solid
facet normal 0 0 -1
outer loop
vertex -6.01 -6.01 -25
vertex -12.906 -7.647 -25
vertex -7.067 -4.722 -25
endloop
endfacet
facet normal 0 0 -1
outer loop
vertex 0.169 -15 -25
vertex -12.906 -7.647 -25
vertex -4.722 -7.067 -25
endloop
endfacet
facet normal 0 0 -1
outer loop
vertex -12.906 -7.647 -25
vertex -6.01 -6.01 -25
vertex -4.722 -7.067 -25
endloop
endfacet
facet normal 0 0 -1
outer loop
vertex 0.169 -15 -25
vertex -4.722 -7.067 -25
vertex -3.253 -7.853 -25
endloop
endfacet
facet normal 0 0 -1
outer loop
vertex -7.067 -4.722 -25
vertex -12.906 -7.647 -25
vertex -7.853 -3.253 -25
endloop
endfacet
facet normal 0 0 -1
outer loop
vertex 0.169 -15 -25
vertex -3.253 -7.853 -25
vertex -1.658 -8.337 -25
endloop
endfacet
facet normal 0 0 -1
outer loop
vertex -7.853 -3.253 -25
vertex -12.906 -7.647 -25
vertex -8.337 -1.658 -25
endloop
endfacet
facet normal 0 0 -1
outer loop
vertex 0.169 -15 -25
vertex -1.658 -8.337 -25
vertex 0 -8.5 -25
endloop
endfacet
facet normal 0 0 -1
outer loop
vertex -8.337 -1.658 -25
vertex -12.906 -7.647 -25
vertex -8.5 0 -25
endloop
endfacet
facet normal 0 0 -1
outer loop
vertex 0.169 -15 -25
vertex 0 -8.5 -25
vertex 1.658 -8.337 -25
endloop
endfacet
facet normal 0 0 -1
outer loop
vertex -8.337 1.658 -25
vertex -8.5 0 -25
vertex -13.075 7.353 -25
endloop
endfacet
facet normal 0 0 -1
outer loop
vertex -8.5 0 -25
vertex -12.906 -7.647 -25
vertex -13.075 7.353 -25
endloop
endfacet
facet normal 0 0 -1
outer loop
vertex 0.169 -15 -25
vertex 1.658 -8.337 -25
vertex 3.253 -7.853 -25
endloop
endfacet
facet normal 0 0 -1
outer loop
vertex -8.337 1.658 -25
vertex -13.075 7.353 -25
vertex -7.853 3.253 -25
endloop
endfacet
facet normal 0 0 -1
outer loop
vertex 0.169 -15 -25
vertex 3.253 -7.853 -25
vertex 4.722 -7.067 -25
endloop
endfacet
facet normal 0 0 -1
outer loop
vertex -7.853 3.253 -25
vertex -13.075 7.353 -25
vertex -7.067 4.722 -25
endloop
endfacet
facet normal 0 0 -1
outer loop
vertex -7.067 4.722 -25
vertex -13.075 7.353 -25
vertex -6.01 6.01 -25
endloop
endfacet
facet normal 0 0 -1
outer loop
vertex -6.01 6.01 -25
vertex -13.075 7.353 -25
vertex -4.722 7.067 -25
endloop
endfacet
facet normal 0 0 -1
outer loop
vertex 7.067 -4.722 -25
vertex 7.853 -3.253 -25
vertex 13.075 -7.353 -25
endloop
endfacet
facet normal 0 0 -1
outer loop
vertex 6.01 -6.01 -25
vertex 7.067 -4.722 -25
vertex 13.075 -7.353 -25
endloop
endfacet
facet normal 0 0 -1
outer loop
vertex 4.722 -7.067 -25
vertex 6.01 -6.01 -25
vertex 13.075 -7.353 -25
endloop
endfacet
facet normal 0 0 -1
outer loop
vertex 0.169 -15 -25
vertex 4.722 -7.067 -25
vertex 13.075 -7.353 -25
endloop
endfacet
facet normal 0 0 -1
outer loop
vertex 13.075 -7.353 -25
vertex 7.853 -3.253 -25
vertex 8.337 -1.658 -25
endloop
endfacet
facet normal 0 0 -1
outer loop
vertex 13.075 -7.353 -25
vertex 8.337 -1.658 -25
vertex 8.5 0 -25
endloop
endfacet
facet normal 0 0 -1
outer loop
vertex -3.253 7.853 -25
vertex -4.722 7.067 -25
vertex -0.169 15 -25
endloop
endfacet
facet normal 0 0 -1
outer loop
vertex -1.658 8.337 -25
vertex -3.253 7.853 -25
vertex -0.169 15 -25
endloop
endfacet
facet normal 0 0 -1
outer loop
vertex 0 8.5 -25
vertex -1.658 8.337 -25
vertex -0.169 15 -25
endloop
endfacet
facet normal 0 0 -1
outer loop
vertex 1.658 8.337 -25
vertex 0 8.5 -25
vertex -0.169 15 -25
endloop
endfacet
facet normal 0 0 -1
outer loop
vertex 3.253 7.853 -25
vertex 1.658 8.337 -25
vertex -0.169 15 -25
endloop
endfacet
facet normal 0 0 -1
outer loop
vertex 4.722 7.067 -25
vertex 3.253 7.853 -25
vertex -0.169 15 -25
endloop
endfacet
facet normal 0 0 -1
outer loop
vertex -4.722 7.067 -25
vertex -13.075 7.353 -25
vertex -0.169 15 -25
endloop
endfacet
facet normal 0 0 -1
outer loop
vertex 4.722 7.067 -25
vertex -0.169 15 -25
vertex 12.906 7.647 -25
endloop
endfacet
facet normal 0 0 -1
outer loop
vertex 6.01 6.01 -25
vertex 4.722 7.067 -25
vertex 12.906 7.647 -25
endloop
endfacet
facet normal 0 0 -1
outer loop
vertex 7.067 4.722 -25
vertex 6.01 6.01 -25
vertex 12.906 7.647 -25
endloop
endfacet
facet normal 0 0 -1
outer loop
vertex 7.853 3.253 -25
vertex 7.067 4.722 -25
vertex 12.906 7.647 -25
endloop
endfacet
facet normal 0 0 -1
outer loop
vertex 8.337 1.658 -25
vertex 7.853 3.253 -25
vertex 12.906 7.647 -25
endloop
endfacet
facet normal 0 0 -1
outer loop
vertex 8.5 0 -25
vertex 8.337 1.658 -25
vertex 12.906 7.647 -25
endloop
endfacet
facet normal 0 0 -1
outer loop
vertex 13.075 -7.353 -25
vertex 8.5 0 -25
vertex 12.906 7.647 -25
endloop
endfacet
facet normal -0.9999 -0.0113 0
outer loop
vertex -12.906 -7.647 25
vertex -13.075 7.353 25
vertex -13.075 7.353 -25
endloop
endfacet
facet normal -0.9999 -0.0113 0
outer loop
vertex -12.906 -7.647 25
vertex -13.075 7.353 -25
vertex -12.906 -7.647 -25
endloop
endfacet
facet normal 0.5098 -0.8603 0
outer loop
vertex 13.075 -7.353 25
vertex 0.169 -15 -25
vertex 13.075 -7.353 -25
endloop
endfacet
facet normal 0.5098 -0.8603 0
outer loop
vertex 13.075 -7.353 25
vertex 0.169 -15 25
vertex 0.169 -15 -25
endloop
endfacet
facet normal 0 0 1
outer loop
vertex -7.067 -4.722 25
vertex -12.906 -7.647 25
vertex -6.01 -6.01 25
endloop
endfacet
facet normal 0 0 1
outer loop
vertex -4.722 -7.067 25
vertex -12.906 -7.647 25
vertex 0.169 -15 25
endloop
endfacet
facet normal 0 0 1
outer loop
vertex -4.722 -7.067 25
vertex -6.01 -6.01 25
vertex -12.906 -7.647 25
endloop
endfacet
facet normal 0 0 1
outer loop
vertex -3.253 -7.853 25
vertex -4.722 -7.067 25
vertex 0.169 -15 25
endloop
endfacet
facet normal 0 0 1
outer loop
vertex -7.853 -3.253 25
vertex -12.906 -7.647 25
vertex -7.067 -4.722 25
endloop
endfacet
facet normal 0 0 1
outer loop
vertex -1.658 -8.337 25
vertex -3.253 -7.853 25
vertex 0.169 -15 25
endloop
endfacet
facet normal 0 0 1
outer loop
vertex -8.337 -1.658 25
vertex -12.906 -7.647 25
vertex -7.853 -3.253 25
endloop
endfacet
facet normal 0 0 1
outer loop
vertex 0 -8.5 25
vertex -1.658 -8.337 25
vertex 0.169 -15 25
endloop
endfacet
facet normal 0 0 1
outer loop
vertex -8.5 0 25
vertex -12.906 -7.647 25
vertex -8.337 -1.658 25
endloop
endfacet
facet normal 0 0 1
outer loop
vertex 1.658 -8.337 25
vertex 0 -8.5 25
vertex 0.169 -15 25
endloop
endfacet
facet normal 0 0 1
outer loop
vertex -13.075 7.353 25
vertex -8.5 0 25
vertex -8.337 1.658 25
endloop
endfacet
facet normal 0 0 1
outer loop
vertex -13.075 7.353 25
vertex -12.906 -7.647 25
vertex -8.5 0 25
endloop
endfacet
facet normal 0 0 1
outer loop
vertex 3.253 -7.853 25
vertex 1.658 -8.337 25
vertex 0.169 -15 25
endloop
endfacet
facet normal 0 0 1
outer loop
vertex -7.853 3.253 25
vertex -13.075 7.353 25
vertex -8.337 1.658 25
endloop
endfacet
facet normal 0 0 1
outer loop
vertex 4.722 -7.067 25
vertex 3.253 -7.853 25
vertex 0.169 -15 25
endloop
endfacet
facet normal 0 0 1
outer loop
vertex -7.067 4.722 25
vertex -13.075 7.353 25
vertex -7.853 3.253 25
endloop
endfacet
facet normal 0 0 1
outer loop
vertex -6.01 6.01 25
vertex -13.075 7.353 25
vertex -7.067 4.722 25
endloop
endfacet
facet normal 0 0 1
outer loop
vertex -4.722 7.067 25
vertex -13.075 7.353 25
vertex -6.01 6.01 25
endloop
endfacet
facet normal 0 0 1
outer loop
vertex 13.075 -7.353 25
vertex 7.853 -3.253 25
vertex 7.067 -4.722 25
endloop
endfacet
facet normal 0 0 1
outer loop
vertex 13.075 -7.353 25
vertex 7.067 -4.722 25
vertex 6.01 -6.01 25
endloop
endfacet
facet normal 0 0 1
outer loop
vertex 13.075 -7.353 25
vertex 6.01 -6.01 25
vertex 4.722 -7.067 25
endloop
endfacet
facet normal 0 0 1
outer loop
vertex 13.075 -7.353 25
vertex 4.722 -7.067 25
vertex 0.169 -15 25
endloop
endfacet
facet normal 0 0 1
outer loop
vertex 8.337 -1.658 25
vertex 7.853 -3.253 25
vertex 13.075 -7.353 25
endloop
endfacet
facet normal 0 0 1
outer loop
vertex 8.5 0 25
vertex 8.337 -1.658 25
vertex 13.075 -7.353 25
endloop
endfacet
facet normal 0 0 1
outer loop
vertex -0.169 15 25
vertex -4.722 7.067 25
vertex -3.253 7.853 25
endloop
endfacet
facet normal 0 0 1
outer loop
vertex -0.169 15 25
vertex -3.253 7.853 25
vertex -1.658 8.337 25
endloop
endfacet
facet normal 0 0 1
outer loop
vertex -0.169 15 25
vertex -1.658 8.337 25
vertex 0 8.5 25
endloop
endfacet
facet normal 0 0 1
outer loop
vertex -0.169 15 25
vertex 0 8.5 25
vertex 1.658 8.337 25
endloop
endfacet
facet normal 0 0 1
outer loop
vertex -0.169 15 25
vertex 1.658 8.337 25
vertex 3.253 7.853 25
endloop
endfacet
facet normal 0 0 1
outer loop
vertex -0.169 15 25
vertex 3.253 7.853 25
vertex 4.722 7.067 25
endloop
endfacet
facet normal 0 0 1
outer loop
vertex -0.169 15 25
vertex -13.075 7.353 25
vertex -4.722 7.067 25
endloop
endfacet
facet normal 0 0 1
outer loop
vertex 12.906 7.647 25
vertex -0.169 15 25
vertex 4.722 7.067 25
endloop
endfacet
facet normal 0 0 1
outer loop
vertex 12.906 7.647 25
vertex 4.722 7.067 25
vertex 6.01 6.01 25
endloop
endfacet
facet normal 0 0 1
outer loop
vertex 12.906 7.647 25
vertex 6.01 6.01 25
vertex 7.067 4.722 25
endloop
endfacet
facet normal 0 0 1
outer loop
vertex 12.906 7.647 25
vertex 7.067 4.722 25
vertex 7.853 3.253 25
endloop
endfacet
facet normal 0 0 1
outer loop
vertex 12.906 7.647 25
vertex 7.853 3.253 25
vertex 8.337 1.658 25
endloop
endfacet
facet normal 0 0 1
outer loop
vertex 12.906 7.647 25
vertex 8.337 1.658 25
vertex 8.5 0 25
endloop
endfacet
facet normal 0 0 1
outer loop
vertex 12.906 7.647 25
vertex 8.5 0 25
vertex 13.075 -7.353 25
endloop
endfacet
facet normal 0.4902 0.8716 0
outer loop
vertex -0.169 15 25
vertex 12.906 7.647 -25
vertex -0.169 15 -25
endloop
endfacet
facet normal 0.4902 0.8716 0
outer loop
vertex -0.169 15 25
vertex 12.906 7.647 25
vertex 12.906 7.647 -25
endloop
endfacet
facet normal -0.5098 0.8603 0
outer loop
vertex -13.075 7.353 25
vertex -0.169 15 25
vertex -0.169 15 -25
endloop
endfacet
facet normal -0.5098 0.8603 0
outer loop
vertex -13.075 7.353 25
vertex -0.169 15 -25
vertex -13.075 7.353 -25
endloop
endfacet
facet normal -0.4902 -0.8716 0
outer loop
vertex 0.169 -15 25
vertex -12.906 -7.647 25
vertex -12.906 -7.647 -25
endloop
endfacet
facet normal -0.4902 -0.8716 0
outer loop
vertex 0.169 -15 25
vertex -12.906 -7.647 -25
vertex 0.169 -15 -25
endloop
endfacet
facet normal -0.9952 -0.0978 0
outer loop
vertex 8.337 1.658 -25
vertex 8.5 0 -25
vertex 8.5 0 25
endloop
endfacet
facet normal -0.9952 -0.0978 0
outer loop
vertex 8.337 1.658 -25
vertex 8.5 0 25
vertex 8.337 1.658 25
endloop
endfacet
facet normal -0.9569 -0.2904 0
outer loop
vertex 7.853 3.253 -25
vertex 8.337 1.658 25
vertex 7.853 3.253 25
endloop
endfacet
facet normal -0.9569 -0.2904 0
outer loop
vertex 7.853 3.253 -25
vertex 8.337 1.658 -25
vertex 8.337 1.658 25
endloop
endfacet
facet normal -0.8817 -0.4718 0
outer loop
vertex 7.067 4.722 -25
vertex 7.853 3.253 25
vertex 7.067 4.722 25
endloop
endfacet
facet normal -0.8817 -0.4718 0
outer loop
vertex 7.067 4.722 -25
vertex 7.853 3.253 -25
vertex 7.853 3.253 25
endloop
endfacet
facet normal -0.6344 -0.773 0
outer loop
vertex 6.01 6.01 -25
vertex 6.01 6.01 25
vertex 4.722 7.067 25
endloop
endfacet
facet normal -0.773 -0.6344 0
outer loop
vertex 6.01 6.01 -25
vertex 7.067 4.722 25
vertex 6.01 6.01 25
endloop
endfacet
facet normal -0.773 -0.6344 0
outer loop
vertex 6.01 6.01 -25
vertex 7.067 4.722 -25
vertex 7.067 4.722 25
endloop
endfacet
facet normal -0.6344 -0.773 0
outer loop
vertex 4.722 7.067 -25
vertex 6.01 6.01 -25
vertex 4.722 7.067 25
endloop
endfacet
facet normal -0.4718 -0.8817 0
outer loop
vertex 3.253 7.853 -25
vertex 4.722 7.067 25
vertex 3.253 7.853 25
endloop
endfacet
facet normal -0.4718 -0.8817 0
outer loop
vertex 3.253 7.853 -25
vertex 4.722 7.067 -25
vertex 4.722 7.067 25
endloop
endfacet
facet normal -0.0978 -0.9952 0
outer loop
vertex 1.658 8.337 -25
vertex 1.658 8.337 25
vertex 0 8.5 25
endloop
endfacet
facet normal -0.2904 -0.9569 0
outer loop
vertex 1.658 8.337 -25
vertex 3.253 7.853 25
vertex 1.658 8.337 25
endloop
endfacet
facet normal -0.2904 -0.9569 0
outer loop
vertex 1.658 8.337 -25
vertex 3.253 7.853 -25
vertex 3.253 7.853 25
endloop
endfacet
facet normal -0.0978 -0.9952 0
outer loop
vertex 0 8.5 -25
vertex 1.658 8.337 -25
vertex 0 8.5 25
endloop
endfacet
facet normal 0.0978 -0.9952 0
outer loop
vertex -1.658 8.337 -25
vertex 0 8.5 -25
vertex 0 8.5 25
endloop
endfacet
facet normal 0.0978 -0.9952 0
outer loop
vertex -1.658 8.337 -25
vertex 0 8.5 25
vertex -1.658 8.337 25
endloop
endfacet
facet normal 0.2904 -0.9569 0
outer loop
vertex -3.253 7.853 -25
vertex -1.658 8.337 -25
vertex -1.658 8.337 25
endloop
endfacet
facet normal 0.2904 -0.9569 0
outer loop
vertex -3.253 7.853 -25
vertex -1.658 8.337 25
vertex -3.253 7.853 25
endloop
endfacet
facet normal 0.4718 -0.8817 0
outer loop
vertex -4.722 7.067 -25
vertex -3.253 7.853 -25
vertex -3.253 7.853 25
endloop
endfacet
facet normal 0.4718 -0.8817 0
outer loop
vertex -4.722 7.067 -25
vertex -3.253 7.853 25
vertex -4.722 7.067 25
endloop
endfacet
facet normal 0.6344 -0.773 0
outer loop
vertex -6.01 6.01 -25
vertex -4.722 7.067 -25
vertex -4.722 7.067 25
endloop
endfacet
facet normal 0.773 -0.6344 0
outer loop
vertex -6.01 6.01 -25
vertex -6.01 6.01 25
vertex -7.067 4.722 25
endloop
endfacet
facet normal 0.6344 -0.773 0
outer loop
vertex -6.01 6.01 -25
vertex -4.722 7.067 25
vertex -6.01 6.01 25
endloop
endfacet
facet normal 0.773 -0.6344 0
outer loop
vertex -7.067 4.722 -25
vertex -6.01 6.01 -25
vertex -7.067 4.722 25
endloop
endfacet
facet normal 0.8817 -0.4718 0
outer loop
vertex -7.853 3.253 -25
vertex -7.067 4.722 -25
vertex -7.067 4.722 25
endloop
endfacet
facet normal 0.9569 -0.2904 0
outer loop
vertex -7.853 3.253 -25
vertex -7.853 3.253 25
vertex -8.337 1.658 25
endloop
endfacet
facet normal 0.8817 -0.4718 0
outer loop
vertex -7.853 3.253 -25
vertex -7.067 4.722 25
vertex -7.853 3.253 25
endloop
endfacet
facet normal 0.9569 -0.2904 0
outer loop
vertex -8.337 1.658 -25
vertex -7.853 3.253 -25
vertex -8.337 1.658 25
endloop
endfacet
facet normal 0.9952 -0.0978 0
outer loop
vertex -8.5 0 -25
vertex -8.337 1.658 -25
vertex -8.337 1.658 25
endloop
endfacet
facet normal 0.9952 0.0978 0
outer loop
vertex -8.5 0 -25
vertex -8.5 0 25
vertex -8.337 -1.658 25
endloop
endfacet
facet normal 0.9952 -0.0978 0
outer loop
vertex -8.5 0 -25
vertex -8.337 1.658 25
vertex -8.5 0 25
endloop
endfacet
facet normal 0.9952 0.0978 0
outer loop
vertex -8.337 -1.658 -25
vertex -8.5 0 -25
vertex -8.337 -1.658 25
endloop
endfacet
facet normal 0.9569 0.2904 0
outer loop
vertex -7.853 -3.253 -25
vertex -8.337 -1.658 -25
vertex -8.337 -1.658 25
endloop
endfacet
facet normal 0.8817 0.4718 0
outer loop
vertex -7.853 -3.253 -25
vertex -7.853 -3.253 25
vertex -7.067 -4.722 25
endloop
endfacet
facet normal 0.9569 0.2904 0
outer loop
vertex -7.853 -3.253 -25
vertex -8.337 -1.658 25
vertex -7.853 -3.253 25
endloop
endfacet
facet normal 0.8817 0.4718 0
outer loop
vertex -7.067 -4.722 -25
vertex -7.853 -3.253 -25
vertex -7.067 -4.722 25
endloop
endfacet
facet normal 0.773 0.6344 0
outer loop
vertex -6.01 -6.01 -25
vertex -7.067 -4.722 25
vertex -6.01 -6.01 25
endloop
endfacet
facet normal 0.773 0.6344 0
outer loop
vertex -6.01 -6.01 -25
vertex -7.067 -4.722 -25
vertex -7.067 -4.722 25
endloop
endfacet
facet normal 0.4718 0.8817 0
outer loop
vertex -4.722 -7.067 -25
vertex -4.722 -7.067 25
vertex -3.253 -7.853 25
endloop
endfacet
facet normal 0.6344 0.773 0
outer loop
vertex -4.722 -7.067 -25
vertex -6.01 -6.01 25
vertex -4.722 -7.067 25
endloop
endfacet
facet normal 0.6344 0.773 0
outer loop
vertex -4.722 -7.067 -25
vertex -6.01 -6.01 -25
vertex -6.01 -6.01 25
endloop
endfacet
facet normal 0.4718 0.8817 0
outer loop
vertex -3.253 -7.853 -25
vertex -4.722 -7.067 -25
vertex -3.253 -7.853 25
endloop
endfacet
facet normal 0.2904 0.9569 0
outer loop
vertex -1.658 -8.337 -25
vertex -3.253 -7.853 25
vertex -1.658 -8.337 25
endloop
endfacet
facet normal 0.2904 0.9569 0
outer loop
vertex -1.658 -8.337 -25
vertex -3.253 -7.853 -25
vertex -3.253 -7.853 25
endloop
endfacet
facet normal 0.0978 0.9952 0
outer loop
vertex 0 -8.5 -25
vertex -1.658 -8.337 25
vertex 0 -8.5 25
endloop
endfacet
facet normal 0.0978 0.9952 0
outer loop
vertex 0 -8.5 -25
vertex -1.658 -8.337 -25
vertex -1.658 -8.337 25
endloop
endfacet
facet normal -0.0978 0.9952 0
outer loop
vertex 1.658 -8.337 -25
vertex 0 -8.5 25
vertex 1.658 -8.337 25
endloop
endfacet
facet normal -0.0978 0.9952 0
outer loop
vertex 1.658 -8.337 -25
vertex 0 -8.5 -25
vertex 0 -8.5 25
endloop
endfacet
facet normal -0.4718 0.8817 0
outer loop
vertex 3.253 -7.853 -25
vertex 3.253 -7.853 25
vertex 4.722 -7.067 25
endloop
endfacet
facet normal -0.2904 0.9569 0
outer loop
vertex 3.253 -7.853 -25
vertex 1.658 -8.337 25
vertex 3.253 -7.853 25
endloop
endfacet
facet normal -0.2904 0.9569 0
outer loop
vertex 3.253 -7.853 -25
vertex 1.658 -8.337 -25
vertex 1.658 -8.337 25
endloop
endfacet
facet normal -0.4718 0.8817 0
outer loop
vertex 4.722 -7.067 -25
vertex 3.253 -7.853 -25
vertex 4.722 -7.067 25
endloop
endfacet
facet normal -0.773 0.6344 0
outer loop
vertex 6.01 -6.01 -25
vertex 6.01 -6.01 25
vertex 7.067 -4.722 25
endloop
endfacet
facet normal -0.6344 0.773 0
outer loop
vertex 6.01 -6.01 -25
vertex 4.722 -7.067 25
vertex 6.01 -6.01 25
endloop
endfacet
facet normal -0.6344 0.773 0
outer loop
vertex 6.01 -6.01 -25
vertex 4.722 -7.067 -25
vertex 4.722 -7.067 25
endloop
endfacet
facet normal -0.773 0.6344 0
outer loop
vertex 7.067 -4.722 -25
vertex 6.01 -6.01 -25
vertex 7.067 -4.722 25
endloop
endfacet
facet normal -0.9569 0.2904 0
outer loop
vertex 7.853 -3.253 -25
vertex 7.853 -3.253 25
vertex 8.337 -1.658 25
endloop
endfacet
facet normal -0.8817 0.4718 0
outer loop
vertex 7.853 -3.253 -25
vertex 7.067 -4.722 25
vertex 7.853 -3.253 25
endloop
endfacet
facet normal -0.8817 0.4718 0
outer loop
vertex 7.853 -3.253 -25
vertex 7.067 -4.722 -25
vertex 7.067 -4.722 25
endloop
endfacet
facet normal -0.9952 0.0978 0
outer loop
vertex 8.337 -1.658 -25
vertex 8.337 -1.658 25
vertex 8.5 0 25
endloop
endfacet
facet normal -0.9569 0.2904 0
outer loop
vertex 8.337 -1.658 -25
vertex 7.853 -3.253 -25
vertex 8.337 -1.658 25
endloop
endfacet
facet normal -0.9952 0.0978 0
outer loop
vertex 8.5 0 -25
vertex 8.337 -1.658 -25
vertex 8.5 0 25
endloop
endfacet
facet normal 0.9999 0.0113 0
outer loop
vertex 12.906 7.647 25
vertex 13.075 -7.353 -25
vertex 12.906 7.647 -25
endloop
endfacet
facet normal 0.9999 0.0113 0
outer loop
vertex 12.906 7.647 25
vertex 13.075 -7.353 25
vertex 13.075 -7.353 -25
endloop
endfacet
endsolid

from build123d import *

# Parameters (mm, degrees)
BOSS_EXTRUDE1_DEPTH     = 25
CUT_EXTRUDE1_DEPTH      = 32.952398564
CUT_EXTRUDE1_DEPTH_BACK = 32.952398564
SKETCH1_R               = 8.5


with BuildPart() as part:
    # Sketch2 → Boss-Extrude1 (new, symmetric)
    with BuildSketch(Plane.XY):
        Polygon((12.905756416, 7.646574177), (-0.169249281, 15), (-13.075005697, 7.353425823), (-12.905756416, -7.646574177), (0.169249281, -15), (13.075005697, -7.353425823), align=None)
    extrude(amount=BOSS_EXTRUDE1_DEPTH, both=True)

    # Sketch1 → Cut-Extrude1 (cut, two sides: drawn at the far end of the back side and taken through both)
    with BuildSketch(Plane.XY.offset(-CUT_EXTRUDE1_DEPTH_BACK)):
        Circle(SKETCH1_R)
    extrude(amount=CUT_EXTRUDE1_DEPTH + CUT_EXTRUDE1_DEPTH_BACK, mode=Mode.SUBTRACT)


solid = part.part
